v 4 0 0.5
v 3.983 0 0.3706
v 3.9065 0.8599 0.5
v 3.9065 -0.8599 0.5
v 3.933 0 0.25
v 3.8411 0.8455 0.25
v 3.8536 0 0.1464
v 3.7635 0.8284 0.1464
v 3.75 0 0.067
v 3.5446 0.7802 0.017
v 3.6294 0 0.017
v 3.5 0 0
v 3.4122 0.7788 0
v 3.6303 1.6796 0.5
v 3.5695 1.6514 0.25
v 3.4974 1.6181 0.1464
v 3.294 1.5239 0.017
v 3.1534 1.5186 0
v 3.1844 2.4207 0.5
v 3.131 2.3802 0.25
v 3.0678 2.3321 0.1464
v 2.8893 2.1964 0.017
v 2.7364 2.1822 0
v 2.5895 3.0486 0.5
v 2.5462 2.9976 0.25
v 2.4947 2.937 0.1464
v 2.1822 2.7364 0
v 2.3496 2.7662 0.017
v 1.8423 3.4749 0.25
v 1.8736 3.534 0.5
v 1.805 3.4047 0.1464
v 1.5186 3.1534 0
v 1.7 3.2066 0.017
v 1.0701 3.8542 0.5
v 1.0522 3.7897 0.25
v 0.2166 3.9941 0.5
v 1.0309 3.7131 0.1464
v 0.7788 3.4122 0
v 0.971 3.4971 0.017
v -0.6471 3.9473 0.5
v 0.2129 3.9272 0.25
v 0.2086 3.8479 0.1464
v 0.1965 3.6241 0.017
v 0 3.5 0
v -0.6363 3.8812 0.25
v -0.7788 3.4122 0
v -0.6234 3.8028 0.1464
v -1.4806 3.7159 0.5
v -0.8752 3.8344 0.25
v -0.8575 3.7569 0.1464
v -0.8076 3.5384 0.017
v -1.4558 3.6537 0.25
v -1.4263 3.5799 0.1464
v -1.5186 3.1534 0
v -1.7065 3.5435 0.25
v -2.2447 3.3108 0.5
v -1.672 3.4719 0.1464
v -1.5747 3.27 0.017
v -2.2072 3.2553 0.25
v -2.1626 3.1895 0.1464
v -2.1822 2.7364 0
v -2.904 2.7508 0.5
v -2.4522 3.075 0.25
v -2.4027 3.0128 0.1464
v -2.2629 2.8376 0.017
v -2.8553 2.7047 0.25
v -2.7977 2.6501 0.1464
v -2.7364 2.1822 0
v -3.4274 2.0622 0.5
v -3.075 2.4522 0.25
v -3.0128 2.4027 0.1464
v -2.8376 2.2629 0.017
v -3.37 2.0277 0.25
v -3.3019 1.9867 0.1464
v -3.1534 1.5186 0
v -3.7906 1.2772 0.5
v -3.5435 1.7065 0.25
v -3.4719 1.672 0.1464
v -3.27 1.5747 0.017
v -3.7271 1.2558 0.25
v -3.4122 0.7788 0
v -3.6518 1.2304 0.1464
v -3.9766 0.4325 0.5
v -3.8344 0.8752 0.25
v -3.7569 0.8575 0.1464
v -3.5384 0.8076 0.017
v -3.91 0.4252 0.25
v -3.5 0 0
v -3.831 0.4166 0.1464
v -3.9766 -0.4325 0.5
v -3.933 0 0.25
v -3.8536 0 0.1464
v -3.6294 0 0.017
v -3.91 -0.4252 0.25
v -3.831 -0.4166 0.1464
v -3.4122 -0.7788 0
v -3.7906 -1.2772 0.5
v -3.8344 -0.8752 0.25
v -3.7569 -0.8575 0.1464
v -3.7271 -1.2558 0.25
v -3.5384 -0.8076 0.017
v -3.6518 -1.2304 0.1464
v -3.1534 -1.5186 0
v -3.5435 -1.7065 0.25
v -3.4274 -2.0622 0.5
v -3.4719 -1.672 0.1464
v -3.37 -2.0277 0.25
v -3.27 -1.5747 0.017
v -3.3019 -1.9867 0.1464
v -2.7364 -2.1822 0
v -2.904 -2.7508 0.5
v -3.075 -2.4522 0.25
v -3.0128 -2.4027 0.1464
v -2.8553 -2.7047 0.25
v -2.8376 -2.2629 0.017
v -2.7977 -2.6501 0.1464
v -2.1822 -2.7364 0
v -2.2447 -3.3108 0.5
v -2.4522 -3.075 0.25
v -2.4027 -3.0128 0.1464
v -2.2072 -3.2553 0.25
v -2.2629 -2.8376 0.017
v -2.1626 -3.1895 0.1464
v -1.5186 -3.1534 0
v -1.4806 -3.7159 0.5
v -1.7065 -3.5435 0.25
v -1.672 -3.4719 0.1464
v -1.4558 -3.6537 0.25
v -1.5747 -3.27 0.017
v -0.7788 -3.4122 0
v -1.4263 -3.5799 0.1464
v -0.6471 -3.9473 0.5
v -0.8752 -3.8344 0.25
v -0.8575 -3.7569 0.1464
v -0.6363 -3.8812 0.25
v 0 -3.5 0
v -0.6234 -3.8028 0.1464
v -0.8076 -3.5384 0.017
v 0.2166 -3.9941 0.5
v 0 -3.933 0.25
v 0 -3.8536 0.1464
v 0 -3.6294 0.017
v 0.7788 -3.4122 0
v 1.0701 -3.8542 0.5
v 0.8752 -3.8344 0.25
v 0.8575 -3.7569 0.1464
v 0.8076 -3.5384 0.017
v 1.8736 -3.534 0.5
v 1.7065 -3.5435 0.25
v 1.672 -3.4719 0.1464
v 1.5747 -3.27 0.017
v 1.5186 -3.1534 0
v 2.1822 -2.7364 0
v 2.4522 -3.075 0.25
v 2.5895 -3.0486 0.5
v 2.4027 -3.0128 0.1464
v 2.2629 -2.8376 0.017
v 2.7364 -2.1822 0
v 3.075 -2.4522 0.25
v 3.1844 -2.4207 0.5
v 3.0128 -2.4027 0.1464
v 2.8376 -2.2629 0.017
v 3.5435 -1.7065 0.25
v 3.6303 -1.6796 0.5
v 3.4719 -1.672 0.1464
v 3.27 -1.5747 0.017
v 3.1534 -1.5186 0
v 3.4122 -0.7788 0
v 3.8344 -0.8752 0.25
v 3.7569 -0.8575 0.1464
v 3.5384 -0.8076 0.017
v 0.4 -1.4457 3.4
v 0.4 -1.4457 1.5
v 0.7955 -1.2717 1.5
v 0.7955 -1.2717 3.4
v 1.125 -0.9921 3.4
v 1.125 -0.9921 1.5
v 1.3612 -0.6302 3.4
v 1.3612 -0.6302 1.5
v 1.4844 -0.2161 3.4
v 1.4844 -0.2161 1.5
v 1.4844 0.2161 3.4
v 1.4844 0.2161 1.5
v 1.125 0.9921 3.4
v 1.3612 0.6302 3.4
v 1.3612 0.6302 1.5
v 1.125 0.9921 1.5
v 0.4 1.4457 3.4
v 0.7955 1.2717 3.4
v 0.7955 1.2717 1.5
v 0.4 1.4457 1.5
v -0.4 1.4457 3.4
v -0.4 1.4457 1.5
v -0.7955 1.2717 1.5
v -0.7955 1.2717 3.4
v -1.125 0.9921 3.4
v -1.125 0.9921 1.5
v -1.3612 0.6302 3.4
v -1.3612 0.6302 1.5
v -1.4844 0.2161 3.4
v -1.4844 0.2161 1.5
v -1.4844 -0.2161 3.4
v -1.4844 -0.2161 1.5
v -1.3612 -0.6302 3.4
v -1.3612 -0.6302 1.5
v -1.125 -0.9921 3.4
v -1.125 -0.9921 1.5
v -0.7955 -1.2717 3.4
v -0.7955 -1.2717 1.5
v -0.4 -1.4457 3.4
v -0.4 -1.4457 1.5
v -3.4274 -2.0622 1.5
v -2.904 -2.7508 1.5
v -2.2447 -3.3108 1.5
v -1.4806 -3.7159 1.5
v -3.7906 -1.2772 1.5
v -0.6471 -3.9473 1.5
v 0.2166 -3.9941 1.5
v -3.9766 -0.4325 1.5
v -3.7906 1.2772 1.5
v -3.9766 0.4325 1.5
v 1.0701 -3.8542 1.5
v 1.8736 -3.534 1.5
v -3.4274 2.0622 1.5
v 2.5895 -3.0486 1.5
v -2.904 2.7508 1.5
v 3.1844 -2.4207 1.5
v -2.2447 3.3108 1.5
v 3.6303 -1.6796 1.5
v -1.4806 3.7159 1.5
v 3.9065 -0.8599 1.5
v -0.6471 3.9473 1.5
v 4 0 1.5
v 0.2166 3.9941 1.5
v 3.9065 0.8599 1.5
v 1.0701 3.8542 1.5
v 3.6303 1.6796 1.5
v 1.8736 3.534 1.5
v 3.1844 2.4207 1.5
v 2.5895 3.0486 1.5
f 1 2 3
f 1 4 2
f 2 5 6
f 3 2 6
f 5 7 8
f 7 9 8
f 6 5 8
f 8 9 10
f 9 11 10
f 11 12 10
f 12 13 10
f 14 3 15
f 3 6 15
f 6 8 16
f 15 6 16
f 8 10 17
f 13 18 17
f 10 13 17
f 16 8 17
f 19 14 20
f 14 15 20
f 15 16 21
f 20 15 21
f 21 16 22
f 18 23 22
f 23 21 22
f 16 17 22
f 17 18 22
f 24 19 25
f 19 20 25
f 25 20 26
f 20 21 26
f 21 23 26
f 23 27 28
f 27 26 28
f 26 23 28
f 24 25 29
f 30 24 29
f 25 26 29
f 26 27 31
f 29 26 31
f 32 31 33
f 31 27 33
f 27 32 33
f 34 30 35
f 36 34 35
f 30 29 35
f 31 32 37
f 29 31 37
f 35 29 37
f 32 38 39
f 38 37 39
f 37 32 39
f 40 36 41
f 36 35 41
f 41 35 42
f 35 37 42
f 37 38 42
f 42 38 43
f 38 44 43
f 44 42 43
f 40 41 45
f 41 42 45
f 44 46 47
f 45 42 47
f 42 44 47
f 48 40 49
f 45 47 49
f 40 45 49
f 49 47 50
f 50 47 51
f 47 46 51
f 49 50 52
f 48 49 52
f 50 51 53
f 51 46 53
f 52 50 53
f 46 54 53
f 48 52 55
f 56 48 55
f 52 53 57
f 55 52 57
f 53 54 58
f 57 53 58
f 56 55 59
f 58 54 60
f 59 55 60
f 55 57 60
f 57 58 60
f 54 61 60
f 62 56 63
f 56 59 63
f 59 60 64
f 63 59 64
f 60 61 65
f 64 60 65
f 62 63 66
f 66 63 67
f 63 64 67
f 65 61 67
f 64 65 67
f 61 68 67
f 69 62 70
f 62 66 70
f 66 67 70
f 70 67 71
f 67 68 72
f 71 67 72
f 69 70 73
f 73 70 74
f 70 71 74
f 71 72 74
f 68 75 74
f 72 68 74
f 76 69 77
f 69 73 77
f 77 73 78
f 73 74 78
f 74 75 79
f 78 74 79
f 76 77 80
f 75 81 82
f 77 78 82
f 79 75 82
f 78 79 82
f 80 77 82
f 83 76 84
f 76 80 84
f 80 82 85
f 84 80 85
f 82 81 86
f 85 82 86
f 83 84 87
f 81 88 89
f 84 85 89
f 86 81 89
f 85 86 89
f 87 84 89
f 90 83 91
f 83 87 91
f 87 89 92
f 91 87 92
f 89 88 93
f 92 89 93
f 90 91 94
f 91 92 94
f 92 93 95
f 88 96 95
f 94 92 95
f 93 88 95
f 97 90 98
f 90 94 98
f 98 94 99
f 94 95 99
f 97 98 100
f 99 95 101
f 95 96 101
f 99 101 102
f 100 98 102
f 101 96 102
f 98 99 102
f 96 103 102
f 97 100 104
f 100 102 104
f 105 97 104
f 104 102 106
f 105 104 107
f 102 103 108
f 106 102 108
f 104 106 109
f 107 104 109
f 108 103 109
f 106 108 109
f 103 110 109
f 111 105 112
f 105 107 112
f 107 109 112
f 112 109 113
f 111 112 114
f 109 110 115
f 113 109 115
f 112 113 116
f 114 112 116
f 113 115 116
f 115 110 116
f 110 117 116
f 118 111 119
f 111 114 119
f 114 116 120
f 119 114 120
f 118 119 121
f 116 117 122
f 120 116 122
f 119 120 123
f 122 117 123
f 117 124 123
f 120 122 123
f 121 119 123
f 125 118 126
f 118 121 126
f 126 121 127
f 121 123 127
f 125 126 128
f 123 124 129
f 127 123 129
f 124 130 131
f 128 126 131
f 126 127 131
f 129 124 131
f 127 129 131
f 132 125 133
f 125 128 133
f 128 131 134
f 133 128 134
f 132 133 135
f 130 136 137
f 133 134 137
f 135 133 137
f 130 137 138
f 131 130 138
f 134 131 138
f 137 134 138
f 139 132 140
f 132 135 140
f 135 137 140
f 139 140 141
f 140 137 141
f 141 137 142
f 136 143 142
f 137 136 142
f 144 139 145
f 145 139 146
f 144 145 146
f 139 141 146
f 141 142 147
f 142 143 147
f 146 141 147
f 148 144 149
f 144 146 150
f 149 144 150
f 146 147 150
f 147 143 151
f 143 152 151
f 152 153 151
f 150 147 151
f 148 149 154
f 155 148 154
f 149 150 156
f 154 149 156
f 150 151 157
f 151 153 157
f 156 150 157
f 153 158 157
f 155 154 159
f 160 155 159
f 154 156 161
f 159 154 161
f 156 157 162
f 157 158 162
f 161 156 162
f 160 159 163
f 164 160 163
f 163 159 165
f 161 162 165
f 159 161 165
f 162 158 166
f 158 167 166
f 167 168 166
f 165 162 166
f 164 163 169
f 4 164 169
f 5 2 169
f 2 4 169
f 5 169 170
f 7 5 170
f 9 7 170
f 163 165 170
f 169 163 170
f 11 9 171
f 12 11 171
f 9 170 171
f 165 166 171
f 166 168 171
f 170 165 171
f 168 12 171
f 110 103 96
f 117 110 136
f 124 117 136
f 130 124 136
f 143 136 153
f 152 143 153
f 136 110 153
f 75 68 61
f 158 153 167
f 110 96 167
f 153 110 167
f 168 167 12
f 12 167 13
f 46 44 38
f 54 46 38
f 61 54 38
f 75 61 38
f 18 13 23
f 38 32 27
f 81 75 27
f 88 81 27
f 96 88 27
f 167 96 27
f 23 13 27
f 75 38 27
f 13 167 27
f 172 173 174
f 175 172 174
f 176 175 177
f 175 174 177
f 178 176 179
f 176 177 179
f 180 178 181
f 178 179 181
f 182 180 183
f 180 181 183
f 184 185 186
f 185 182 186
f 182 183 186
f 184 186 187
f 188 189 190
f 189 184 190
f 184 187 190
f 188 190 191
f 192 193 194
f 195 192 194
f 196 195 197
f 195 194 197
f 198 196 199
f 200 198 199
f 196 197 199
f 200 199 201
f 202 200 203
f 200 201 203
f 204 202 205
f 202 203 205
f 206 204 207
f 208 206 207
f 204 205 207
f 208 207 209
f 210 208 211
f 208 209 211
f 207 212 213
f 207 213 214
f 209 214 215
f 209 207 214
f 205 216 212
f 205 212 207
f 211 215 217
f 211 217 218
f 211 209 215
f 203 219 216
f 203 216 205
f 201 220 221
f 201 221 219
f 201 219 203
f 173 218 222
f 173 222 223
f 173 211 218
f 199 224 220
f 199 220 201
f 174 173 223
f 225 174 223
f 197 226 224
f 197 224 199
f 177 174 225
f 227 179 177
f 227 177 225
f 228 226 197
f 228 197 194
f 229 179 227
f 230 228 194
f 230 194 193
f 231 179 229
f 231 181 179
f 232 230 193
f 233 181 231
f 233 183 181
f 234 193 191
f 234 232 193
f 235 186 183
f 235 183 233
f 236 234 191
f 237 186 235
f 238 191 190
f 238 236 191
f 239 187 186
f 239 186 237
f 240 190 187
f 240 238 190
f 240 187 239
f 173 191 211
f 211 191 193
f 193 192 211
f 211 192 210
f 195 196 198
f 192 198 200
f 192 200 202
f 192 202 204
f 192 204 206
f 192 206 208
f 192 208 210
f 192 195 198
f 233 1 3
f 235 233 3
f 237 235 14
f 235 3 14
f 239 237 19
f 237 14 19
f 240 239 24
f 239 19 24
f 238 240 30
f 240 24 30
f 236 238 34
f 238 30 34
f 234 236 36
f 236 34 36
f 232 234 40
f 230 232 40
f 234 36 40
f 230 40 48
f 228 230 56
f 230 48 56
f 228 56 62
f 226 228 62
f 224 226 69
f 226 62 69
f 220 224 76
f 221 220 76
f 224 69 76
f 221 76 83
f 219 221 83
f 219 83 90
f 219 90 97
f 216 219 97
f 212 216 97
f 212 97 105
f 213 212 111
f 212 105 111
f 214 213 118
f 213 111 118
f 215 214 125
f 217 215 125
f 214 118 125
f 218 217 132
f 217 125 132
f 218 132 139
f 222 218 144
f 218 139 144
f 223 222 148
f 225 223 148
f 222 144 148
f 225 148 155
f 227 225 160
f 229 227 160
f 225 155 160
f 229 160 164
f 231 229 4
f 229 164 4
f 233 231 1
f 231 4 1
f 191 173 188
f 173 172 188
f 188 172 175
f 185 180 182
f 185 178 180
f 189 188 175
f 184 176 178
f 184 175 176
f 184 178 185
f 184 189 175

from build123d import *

# Parameters (mm, degrees)
F0_R     = 4
F1_DEPTH = 1.5
F2_R     = 1.5
F3_DEPTH = 1.9
F5_DEPTH = 1.9
F7_DEPTH = 0.3
F8_R     = 0.5


# Not quite as in the source:
# - a feature names something its author has since deleted; it is built from what else it names


with BuildPart() as f1:
    # F0 (on Top) → F1 (new body)
    with BuildSketch(Plane.XY):
        Circle(F0_R)
    extrude(amount=F1_DEPTH)

    # F2 (on face) → F3 (join)
    with BuildSketch(Plane.XY.offset(1.5)):
        Circle(F2_R)
    extrude(amount=F3_DEPTH)

    # F4 (on face) → F5 (cut)
    with BuildSketch(Plane.XY.offset(3.4)):
        with BuildLine():
            ThreePointArc((-0.4, -1.4456832295), (0, -1.5), (0.4, -1.4456832295))
            Line((0.4, -1.4456832295), (0.4, 1.4456832295))
            ThreePointArc((0.4, 1.4456832295), (0, 1.5), (-0.4, 1.4456832295))
            Line((-0.4, 1.4456832295), (-0.4, -1.4456832295))
        make_face()
        with BuildLine():
            ThreePointArc((-0.4, 1.4456832295), (0, 1.5), (0.4, 1.4456832295))
            Line((0.4, 1.4456832295), (0.4, 2.5026321411))
            Line((0.4, 2.5026321411), (-0.4, 2.5026321411))
            Line((-0.4, 2.5026321411), (-0.4, 1.4456832295))
        make_face()
    extrude(amount=-F5_DEPTH, mode=Mode.SUBTRACT)

    # F6 (on face) → F7 (join)
    with BuildSketch(Plane.XY.offset(1.5)):
        with BuildLine():
            ThreePointArc((0.4, 1.3937359865), (1.1581234822, 0.8724964183), (1.45, 0))
            ThreePointArc((1.45, 0), (1.1581234822, -0.8724964183), (0.4, -1.3937359865))
            Line((0.4, -1.3937359865), (0.4, -1.4456832295))
            ThreePointArc((0.4, -1.4456832295), (1.5, 0), (0.4, 1.4456832295))
            Line((0.4, 1.4456832295), (0.4, 1.3937359865))
        make_face()
        with BuildLine():
            ThreePointArc((-0.4, -1.3937359865), (-1.45, 0), (-0.4, 1.3937359865))
            Line((-0.4, 1.3937359865), (-0.4, 1.4456832295))
            ThreePointArc((-0.4, 1.4456832295), (-1.5, 0), (-0.4, -1.4456832295))
            Line((-0.4, -1.4456832295), (-0.4, -1.3937359865))
        make_face()
    extrude(amount=F7_DEPTH)

    # F8
    f8_edges = [f1.edges().sort_by_distance(p)[0] for p in [
        (-4, 0, 0),
    ]]
    fillet(f8_edges, radius=F8_R)


solid = f1.part
